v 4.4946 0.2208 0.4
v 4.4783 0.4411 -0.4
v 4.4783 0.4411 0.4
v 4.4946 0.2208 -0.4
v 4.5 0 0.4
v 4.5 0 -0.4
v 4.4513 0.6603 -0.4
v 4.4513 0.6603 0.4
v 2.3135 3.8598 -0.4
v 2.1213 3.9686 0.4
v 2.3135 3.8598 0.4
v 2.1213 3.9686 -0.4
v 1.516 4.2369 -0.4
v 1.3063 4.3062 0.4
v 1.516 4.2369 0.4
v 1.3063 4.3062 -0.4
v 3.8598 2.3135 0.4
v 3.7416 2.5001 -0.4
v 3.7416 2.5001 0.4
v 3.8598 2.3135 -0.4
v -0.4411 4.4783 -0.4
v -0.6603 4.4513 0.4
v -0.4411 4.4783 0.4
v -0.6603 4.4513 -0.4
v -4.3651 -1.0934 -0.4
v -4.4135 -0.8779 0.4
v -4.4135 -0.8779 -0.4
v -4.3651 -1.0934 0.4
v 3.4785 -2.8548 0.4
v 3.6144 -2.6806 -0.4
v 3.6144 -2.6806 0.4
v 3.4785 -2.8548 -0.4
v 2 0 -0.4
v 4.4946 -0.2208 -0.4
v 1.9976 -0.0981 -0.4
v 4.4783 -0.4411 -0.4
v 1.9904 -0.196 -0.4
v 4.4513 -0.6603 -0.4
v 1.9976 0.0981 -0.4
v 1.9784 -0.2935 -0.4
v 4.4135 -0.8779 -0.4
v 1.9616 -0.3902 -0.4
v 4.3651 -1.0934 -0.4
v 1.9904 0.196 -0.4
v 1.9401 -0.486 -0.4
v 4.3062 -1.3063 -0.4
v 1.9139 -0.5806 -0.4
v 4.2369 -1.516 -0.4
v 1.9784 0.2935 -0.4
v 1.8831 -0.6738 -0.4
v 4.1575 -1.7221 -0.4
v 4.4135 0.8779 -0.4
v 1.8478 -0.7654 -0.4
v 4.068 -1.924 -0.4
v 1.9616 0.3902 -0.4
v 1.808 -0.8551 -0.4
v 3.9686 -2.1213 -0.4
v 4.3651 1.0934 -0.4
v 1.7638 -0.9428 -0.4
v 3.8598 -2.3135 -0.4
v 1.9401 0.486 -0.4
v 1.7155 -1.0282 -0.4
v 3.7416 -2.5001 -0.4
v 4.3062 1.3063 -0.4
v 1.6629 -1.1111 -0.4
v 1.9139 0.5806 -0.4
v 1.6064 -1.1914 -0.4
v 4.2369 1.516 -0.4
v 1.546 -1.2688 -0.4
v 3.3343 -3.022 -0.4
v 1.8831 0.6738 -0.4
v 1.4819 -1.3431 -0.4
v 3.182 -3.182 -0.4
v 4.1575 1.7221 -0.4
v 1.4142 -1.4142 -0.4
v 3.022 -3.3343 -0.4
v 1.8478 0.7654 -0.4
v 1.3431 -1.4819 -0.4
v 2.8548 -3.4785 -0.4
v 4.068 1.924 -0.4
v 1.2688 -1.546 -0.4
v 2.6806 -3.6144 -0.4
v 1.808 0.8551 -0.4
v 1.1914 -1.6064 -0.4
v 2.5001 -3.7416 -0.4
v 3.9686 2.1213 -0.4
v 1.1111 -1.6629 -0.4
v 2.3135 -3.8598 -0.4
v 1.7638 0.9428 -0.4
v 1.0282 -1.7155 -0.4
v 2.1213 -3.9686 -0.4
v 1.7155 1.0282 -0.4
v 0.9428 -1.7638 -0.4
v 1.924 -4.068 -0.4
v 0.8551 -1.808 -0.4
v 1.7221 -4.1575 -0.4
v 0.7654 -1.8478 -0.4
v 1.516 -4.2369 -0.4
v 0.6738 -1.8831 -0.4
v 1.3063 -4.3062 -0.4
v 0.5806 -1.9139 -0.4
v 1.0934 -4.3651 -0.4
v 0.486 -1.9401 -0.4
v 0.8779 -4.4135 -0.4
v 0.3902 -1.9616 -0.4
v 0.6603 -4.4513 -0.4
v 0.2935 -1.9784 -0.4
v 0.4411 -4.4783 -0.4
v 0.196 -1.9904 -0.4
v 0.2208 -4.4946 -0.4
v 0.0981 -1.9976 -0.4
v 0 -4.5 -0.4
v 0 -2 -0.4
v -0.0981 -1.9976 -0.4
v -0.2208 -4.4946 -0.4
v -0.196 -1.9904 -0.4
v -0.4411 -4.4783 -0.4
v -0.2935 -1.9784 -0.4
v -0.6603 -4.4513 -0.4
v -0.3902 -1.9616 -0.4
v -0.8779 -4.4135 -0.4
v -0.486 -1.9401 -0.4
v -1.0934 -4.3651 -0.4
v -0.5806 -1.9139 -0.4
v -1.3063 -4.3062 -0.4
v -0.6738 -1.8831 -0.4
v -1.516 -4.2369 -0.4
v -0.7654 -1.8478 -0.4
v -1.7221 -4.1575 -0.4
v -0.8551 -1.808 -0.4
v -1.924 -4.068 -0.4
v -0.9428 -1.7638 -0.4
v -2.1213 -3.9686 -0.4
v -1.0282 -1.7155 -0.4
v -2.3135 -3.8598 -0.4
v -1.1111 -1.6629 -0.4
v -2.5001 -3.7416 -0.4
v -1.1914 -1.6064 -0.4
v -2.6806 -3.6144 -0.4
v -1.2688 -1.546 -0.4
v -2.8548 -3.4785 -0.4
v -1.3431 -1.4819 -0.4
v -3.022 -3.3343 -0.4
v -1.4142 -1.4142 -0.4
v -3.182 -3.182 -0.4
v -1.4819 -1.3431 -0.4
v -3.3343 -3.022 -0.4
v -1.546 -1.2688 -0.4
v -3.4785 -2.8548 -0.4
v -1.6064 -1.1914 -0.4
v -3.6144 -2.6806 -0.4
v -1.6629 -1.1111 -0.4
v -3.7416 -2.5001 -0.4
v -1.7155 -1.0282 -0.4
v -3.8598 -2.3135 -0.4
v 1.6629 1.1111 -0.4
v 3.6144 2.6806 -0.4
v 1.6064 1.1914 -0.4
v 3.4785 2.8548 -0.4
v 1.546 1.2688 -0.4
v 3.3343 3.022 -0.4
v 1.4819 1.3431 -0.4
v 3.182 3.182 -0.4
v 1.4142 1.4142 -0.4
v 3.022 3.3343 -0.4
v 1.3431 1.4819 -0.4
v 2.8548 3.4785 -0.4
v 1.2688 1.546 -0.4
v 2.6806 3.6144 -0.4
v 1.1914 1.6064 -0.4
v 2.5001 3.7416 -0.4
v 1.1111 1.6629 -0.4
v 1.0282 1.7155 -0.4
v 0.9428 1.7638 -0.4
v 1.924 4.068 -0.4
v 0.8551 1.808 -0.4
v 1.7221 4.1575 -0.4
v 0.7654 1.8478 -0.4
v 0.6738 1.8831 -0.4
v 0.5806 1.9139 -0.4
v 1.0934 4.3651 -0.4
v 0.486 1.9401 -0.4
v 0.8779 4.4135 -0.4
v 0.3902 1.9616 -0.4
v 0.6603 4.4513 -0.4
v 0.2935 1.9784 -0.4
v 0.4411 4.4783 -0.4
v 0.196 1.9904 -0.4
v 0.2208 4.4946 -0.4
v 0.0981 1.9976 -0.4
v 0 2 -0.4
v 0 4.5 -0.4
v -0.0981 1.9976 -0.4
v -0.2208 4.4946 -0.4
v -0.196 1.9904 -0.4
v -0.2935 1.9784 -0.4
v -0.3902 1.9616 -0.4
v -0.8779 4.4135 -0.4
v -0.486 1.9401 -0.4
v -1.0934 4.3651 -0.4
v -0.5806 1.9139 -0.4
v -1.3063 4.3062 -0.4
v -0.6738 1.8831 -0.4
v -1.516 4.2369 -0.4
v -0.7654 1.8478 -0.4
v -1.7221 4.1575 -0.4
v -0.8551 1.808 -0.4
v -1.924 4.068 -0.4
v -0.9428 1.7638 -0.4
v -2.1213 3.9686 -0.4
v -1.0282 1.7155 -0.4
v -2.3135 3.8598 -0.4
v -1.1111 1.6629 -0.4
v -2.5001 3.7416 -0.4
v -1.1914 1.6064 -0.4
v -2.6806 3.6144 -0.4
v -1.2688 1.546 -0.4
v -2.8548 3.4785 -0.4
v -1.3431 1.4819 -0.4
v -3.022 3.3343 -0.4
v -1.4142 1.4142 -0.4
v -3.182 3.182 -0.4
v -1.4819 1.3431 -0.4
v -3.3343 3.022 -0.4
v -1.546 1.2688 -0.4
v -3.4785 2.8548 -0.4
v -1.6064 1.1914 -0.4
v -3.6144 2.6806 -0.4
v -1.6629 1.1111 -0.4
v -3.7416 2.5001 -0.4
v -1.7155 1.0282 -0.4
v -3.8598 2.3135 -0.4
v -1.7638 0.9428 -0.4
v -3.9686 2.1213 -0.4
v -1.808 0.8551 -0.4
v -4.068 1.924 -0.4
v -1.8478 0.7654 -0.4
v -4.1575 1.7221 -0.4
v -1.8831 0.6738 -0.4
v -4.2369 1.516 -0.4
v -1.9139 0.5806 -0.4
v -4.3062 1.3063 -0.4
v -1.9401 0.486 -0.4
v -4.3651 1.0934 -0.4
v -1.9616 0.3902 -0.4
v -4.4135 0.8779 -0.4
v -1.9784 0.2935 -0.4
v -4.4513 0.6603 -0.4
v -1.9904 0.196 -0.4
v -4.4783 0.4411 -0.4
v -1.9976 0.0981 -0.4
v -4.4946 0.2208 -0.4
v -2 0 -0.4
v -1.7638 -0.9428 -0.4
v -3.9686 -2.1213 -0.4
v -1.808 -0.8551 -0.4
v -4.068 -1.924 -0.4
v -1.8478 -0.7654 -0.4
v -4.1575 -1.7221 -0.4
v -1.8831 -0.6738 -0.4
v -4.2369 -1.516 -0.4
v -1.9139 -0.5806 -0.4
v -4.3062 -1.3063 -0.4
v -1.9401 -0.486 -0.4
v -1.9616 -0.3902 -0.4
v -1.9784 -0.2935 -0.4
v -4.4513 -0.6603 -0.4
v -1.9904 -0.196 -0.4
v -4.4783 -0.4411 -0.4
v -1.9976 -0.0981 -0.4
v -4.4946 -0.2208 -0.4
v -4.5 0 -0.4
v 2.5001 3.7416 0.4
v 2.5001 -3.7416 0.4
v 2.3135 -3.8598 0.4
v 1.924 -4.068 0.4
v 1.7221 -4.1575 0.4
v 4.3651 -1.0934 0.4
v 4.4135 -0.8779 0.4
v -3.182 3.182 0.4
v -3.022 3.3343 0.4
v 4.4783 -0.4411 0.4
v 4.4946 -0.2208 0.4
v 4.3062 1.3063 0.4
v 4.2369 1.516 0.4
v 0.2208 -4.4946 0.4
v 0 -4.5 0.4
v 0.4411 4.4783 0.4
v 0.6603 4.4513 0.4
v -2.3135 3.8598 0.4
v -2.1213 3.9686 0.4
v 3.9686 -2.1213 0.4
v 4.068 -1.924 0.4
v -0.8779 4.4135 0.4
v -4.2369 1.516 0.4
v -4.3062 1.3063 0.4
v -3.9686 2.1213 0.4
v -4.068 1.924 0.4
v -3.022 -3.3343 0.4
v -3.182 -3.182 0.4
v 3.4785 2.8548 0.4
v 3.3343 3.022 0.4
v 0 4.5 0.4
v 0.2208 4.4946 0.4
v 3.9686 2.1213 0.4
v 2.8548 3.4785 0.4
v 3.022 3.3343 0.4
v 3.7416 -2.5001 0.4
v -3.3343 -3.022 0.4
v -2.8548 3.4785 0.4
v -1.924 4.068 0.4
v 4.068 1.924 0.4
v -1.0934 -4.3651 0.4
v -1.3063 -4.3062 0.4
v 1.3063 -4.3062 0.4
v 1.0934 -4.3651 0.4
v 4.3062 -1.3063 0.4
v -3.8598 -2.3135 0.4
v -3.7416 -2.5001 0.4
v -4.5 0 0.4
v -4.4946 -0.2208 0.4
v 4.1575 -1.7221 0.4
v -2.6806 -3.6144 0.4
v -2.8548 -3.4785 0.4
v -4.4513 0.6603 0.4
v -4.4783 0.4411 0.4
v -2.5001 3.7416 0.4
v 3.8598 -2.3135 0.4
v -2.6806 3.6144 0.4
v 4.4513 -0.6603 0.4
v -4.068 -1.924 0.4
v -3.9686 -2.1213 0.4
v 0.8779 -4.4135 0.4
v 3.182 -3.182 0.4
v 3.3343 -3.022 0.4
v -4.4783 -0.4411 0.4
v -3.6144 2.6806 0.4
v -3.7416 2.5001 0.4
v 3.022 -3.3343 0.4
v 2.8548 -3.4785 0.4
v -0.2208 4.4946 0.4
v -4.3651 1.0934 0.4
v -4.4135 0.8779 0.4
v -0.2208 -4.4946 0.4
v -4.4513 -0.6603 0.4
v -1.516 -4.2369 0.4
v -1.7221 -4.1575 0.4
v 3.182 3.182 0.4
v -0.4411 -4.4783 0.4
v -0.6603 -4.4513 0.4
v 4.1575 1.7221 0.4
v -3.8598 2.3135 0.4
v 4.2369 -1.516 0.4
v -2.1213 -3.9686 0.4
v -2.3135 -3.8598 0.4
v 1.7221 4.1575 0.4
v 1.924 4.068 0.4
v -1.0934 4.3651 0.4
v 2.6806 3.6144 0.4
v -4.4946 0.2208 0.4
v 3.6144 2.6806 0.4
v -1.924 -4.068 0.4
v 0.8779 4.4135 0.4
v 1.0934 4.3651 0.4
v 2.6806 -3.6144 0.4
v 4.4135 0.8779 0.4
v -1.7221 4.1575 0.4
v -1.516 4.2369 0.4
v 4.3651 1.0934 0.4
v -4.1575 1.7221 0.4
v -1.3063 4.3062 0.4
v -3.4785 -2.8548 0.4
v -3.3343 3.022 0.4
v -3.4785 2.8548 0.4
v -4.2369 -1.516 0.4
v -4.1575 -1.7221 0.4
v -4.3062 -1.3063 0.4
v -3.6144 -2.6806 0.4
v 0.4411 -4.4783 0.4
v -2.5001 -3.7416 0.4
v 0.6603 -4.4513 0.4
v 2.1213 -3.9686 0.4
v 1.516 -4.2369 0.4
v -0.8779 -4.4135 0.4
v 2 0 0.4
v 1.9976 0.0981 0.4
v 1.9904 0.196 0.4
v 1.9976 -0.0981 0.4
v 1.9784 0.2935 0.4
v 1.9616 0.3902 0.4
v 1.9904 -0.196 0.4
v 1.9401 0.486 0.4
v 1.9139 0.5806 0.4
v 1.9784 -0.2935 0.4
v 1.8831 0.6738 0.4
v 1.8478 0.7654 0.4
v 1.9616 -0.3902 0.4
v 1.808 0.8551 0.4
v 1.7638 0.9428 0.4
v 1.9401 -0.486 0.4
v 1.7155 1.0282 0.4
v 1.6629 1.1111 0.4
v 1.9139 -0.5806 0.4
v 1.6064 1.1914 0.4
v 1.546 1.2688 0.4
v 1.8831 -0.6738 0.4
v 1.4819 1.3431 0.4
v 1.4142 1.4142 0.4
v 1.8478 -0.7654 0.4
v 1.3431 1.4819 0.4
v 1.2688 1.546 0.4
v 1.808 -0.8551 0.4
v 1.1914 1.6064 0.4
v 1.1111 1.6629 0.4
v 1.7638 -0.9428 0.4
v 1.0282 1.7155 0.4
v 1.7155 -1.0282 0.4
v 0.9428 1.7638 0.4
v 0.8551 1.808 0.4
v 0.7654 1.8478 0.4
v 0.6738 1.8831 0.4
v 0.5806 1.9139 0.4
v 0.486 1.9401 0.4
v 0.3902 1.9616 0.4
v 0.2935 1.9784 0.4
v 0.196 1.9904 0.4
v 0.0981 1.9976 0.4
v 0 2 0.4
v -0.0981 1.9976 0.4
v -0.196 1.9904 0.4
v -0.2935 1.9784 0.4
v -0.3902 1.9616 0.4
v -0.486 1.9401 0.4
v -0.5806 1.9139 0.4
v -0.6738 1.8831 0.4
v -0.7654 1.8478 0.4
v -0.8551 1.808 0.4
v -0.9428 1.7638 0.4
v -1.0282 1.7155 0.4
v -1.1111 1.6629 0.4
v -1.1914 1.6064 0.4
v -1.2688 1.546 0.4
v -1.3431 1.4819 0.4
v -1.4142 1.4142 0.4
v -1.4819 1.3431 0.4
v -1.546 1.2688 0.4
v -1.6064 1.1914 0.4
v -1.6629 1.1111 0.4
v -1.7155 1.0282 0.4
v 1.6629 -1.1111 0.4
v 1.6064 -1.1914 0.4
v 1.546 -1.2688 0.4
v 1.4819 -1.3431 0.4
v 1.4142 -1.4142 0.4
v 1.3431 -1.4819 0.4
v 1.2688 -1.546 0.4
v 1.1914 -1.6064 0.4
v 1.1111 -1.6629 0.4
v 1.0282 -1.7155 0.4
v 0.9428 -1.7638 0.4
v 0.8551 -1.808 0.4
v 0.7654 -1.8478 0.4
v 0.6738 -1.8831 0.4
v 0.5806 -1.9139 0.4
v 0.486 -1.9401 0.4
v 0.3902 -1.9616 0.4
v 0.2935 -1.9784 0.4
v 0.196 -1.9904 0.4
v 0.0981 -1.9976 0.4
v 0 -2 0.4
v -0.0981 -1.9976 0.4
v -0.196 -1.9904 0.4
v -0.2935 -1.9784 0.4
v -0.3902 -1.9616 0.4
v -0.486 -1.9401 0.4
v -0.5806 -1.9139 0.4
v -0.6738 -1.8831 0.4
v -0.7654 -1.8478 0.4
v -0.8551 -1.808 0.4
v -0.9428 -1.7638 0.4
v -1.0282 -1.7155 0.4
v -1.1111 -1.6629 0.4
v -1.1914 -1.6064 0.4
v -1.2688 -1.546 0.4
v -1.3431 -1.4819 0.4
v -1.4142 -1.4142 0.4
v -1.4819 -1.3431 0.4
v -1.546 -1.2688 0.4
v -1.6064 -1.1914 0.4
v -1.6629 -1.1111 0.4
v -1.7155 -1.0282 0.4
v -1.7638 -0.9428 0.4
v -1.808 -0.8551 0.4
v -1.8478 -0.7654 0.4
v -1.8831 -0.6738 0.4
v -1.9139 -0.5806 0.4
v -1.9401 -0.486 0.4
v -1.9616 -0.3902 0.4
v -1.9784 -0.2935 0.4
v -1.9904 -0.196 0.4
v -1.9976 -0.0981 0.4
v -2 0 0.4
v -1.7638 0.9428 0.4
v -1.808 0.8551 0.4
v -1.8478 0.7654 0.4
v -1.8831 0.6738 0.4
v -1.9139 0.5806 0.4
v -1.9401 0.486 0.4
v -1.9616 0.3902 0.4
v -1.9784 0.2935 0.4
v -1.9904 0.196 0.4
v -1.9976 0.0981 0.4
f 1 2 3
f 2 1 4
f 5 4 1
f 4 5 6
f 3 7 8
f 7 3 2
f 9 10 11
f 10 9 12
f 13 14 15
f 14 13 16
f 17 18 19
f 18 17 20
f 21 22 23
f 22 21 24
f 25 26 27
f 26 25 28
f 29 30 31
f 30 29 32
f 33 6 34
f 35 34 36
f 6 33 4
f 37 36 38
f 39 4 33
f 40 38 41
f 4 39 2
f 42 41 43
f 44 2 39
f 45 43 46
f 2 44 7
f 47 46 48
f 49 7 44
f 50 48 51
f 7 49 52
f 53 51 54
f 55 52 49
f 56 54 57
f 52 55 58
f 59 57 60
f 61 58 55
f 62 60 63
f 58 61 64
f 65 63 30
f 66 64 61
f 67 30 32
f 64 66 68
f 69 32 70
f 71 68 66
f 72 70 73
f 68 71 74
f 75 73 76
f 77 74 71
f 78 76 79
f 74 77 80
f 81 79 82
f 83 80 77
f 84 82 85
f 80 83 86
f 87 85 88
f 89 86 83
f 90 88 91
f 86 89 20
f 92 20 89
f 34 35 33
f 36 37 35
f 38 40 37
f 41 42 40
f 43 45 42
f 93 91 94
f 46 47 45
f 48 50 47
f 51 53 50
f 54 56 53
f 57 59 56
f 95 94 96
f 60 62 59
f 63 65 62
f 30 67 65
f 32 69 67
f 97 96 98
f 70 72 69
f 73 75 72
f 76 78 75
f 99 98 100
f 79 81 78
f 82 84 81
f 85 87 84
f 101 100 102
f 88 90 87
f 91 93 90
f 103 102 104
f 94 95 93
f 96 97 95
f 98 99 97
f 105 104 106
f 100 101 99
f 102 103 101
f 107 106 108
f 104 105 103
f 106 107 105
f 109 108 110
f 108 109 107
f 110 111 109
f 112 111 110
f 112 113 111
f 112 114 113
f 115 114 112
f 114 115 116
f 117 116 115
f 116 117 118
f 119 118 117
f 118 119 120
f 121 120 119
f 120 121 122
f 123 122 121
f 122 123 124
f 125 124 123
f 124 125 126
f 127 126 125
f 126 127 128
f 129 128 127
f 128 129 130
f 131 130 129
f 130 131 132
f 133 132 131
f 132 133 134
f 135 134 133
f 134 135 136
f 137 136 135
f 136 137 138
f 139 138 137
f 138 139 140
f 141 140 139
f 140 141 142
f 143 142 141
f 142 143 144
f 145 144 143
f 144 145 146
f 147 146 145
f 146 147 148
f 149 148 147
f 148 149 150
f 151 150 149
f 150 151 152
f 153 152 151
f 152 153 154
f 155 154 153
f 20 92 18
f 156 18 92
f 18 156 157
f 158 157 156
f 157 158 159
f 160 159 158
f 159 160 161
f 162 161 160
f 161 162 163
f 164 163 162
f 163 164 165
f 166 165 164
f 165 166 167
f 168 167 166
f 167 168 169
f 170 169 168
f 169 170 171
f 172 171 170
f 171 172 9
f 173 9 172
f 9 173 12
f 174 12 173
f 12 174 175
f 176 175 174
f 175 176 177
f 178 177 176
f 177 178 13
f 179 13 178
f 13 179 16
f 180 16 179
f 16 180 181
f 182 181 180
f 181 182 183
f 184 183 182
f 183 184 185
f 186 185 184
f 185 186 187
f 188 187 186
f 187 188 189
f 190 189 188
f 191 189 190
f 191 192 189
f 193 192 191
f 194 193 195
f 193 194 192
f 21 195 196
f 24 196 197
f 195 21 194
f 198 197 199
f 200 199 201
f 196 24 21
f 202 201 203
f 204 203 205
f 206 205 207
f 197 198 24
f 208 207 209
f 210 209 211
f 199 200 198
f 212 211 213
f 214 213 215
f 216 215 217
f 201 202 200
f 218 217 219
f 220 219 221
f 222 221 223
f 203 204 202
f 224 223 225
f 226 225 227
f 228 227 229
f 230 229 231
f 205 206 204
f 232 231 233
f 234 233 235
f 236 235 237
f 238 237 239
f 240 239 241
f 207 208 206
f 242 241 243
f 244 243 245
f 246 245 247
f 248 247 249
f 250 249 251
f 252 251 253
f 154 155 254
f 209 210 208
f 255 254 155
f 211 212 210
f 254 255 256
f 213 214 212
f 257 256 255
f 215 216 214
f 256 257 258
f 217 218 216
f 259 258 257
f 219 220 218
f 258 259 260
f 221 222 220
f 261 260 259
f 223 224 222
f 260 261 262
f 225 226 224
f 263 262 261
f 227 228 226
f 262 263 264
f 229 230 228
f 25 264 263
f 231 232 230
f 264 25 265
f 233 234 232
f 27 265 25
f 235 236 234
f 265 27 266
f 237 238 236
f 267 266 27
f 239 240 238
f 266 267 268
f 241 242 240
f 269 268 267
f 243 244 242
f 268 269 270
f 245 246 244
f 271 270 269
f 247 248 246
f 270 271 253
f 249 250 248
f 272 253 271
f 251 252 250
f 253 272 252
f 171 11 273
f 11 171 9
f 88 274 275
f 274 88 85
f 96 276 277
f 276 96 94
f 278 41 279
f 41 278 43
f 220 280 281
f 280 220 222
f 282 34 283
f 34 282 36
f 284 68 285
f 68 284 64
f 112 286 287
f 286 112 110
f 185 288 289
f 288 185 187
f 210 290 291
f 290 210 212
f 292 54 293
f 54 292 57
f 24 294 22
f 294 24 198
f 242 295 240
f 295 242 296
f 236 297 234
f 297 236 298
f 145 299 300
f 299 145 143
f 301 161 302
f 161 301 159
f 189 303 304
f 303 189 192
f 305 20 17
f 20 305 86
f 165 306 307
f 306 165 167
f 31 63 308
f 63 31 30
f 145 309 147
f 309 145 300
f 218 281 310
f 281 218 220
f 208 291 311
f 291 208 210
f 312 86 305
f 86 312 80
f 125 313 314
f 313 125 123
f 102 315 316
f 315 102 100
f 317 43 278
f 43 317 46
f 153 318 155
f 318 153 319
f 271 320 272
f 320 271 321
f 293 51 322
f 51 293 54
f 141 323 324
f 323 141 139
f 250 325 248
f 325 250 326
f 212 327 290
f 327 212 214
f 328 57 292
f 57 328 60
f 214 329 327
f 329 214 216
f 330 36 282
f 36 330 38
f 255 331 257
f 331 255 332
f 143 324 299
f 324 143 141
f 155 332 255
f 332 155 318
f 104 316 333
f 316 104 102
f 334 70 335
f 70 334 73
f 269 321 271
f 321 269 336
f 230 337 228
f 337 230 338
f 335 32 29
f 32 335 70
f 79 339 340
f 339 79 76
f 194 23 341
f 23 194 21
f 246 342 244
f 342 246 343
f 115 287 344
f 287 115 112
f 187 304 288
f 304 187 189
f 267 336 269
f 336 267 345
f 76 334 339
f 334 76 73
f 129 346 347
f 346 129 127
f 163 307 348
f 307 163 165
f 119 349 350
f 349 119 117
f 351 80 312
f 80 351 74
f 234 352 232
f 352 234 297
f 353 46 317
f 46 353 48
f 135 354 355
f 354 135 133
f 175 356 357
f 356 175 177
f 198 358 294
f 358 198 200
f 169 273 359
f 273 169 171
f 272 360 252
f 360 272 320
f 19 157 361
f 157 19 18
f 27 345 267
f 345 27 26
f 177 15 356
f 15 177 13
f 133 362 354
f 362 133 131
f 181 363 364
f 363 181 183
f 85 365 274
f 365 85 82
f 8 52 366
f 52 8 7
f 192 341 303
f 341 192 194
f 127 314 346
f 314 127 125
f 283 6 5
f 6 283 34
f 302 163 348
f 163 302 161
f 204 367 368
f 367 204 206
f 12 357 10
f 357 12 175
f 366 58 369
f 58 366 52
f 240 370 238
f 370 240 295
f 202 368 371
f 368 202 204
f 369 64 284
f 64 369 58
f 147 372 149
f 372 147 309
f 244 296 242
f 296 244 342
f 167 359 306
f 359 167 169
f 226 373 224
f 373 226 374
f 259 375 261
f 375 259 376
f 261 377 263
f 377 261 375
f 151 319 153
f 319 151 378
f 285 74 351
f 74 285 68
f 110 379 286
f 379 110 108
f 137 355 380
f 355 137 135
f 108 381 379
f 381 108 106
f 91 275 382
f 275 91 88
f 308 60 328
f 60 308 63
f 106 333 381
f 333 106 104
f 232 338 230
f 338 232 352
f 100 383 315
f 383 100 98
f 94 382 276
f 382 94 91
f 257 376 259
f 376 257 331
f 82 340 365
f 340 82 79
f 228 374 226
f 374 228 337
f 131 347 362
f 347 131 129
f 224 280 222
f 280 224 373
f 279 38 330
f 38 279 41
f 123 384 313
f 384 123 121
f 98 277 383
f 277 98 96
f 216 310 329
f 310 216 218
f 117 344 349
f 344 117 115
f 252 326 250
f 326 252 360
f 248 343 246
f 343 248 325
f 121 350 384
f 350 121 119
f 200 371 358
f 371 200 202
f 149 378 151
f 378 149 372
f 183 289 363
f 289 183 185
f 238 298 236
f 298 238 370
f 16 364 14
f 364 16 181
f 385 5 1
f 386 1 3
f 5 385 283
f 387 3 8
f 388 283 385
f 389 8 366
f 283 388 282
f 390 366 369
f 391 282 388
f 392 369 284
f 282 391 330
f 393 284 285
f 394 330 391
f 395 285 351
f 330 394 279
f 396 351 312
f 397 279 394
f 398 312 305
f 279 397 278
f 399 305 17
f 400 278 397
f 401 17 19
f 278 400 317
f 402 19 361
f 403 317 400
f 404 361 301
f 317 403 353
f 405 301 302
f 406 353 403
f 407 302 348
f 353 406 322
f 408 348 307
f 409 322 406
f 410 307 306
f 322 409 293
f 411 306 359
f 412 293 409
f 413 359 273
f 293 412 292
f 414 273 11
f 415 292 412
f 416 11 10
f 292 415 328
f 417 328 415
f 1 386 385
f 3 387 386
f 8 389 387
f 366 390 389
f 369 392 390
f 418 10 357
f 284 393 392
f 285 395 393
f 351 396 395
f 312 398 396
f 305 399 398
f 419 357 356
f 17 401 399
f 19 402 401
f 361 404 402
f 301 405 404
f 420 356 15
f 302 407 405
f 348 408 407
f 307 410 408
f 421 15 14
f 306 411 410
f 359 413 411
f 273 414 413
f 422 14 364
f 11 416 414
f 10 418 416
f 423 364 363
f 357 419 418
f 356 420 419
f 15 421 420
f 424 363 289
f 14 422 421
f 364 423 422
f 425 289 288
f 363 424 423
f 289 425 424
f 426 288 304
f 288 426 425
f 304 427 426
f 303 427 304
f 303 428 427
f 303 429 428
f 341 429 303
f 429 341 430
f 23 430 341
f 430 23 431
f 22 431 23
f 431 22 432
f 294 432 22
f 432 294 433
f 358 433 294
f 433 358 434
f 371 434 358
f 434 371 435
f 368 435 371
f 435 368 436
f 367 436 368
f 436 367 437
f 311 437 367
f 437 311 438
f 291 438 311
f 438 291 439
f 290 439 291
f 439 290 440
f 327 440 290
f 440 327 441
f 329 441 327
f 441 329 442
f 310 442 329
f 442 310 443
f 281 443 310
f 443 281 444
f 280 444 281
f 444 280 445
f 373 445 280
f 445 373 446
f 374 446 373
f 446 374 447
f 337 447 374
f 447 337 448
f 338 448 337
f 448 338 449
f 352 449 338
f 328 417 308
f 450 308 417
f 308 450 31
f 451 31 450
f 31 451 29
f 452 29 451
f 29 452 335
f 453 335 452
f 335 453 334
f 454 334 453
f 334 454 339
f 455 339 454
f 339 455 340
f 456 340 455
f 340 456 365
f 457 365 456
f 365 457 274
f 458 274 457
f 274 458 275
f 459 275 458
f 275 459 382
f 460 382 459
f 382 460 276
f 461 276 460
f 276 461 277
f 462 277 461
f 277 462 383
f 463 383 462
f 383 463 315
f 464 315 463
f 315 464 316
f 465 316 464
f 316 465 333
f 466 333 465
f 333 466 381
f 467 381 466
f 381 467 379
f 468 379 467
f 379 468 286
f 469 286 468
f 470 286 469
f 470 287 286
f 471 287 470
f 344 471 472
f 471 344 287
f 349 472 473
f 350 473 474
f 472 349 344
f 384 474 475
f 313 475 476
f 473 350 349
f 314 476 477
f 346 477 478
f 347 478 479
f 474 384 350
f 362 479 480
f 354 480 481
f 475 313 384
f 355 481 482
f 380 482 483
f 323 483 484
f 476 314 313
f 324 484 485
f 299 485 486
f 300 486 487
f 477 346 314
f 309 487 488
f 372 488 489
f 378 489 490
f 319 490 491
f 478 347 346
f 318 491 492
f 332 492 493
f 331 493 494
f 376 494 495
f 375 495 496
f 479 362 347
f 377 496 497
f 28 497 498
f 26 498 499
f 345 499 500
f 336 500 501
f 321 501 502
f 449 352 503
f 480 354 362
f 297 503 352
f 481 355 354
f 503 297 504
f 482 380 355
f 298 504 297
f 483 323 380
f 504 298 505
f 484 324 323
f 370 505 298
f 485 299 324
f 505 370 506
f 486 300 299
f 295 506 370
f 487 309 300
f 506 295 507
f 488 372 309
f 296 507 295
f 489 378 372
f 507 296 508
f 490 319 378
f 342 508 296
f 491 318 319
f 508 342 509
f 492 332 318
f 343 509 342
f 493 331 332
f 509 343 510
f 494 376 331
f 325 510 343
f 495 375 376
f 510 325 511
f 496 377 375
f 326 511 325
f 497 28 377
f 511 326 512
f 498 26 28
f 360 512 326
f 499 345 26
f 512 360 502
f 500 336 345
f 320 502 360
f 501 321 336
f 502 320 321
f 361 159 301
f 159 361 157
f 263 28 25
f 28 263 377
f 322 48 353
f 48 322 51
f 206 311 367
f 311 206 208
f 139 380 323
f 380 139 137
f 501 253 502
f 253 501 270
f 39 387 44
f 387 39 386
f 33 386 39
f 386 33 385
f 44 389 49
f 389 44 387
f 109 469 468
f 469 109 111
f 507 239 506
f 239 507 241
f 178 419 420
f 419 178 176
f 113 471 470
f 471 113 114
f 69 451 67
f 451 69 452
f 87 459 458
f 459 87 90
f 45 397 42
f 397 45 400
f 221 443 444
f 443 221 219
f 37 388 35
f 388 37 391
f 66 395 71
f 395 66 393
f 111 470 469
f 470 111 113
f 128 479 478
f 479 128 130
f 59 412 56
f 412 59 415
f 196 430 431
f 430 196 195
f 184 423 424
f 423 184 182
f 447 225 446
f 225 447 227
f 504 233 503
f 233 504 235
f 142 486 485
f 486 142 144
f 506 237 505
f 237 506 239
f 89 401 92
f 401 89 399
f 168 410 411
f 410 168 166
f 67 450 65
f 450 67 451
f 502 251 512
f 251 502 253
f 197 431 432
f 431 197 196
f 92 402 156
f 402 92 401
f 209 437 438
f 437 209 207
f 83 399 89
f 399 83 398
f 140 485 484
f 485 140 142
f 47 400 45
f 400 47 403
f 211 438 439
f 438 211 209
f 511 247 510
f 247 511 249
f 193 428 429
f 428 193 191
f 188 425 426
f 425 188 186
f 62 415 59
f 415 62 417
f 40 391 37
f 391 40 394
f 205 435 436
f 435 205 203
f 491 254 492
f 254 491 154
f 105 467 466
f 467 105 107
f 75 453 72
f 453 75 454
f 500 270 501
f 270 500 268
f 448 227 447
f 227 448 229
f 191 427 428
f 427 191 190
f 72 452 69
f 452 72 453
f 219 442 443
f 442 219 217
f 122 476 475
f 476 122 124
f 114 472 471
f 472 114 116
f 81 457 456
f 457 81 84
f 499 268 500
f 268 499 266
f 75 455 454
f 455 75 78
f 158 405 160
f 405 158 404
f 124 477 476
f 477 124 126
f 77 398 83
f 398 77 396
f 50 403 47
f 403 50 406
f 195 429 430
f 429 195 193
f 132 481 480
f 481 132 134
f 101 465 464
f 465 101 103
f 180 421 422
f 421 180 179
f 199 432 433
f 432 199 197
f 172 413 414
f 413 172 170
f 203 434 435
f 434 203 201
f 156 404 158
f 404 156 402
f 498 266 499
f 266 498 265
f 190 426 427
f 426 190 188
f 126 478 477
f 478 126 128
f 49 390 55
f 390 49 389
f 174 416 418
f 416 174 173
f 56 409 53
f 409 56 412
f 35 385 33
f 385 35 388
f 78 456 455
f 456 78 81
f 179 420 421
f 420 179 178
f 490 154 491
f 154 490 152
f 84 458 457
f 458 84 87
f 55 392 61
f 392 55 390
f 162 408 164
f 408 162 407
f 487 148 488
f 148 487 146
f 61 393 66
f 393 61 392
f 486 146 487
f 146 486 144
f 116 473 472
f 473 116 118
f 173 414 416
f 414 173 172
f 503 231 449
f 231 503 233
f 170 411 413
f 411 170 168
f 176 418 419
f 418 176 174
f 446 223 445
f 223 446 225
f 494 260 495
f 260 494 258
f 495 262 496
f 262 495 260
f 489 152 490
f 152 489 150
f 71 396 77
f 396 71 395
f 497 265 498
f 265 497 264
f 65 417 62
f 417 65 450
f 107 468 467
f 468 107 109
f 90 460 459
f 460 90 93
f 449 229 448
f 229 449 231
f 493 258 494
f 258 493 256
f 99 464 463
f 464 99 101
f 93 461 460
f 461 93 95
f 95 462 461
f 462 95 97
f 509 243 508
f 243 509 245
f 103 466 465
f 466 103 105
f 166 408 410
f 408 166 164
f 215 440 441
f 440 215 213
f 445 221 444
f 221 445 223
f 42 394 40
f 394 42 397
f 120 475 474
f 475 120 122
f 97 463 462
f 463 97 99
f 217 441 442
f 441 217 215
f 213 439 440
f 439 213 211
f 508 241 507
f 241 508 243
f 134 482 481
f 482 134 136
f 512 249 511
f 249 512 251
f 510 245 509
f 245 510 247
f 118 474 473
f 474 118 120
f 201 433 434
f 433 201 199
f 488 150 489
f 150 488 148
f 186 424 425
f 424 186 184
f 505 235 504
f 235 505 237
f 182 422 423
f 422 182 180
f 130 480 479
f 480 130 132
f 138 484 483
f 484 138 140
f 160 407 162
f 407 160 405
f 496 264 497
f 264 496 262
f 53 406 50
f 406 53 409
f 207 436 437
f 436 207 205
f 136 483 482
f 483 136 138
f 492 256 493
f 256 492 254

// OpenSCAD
// Flat washer parameters (mm)
inner_diameter_mm = 4.0;   //[2.0:8.0:0.1]
outer_diameter_mm = 9.0;   //[4.5:18.0:0.1]
thickness_mm      = 0.8;   //[0.4:1.6:0.05]
eps_mm            = 0.2;   //[0.05:0.5:0.05]

// Smoothness for circular profiles
$fn = 128;

module flat_washer(id, od, t, eps=0.1) {
    difference() {
        cylinder(d=od, h=t, center=true);
        cylinder(d=id, h=t + 2*eps, center=true);
    }
}

flat_washer(inner_diameter_mm, outer_diameter_mm, thickness_mm, eps_mm);
